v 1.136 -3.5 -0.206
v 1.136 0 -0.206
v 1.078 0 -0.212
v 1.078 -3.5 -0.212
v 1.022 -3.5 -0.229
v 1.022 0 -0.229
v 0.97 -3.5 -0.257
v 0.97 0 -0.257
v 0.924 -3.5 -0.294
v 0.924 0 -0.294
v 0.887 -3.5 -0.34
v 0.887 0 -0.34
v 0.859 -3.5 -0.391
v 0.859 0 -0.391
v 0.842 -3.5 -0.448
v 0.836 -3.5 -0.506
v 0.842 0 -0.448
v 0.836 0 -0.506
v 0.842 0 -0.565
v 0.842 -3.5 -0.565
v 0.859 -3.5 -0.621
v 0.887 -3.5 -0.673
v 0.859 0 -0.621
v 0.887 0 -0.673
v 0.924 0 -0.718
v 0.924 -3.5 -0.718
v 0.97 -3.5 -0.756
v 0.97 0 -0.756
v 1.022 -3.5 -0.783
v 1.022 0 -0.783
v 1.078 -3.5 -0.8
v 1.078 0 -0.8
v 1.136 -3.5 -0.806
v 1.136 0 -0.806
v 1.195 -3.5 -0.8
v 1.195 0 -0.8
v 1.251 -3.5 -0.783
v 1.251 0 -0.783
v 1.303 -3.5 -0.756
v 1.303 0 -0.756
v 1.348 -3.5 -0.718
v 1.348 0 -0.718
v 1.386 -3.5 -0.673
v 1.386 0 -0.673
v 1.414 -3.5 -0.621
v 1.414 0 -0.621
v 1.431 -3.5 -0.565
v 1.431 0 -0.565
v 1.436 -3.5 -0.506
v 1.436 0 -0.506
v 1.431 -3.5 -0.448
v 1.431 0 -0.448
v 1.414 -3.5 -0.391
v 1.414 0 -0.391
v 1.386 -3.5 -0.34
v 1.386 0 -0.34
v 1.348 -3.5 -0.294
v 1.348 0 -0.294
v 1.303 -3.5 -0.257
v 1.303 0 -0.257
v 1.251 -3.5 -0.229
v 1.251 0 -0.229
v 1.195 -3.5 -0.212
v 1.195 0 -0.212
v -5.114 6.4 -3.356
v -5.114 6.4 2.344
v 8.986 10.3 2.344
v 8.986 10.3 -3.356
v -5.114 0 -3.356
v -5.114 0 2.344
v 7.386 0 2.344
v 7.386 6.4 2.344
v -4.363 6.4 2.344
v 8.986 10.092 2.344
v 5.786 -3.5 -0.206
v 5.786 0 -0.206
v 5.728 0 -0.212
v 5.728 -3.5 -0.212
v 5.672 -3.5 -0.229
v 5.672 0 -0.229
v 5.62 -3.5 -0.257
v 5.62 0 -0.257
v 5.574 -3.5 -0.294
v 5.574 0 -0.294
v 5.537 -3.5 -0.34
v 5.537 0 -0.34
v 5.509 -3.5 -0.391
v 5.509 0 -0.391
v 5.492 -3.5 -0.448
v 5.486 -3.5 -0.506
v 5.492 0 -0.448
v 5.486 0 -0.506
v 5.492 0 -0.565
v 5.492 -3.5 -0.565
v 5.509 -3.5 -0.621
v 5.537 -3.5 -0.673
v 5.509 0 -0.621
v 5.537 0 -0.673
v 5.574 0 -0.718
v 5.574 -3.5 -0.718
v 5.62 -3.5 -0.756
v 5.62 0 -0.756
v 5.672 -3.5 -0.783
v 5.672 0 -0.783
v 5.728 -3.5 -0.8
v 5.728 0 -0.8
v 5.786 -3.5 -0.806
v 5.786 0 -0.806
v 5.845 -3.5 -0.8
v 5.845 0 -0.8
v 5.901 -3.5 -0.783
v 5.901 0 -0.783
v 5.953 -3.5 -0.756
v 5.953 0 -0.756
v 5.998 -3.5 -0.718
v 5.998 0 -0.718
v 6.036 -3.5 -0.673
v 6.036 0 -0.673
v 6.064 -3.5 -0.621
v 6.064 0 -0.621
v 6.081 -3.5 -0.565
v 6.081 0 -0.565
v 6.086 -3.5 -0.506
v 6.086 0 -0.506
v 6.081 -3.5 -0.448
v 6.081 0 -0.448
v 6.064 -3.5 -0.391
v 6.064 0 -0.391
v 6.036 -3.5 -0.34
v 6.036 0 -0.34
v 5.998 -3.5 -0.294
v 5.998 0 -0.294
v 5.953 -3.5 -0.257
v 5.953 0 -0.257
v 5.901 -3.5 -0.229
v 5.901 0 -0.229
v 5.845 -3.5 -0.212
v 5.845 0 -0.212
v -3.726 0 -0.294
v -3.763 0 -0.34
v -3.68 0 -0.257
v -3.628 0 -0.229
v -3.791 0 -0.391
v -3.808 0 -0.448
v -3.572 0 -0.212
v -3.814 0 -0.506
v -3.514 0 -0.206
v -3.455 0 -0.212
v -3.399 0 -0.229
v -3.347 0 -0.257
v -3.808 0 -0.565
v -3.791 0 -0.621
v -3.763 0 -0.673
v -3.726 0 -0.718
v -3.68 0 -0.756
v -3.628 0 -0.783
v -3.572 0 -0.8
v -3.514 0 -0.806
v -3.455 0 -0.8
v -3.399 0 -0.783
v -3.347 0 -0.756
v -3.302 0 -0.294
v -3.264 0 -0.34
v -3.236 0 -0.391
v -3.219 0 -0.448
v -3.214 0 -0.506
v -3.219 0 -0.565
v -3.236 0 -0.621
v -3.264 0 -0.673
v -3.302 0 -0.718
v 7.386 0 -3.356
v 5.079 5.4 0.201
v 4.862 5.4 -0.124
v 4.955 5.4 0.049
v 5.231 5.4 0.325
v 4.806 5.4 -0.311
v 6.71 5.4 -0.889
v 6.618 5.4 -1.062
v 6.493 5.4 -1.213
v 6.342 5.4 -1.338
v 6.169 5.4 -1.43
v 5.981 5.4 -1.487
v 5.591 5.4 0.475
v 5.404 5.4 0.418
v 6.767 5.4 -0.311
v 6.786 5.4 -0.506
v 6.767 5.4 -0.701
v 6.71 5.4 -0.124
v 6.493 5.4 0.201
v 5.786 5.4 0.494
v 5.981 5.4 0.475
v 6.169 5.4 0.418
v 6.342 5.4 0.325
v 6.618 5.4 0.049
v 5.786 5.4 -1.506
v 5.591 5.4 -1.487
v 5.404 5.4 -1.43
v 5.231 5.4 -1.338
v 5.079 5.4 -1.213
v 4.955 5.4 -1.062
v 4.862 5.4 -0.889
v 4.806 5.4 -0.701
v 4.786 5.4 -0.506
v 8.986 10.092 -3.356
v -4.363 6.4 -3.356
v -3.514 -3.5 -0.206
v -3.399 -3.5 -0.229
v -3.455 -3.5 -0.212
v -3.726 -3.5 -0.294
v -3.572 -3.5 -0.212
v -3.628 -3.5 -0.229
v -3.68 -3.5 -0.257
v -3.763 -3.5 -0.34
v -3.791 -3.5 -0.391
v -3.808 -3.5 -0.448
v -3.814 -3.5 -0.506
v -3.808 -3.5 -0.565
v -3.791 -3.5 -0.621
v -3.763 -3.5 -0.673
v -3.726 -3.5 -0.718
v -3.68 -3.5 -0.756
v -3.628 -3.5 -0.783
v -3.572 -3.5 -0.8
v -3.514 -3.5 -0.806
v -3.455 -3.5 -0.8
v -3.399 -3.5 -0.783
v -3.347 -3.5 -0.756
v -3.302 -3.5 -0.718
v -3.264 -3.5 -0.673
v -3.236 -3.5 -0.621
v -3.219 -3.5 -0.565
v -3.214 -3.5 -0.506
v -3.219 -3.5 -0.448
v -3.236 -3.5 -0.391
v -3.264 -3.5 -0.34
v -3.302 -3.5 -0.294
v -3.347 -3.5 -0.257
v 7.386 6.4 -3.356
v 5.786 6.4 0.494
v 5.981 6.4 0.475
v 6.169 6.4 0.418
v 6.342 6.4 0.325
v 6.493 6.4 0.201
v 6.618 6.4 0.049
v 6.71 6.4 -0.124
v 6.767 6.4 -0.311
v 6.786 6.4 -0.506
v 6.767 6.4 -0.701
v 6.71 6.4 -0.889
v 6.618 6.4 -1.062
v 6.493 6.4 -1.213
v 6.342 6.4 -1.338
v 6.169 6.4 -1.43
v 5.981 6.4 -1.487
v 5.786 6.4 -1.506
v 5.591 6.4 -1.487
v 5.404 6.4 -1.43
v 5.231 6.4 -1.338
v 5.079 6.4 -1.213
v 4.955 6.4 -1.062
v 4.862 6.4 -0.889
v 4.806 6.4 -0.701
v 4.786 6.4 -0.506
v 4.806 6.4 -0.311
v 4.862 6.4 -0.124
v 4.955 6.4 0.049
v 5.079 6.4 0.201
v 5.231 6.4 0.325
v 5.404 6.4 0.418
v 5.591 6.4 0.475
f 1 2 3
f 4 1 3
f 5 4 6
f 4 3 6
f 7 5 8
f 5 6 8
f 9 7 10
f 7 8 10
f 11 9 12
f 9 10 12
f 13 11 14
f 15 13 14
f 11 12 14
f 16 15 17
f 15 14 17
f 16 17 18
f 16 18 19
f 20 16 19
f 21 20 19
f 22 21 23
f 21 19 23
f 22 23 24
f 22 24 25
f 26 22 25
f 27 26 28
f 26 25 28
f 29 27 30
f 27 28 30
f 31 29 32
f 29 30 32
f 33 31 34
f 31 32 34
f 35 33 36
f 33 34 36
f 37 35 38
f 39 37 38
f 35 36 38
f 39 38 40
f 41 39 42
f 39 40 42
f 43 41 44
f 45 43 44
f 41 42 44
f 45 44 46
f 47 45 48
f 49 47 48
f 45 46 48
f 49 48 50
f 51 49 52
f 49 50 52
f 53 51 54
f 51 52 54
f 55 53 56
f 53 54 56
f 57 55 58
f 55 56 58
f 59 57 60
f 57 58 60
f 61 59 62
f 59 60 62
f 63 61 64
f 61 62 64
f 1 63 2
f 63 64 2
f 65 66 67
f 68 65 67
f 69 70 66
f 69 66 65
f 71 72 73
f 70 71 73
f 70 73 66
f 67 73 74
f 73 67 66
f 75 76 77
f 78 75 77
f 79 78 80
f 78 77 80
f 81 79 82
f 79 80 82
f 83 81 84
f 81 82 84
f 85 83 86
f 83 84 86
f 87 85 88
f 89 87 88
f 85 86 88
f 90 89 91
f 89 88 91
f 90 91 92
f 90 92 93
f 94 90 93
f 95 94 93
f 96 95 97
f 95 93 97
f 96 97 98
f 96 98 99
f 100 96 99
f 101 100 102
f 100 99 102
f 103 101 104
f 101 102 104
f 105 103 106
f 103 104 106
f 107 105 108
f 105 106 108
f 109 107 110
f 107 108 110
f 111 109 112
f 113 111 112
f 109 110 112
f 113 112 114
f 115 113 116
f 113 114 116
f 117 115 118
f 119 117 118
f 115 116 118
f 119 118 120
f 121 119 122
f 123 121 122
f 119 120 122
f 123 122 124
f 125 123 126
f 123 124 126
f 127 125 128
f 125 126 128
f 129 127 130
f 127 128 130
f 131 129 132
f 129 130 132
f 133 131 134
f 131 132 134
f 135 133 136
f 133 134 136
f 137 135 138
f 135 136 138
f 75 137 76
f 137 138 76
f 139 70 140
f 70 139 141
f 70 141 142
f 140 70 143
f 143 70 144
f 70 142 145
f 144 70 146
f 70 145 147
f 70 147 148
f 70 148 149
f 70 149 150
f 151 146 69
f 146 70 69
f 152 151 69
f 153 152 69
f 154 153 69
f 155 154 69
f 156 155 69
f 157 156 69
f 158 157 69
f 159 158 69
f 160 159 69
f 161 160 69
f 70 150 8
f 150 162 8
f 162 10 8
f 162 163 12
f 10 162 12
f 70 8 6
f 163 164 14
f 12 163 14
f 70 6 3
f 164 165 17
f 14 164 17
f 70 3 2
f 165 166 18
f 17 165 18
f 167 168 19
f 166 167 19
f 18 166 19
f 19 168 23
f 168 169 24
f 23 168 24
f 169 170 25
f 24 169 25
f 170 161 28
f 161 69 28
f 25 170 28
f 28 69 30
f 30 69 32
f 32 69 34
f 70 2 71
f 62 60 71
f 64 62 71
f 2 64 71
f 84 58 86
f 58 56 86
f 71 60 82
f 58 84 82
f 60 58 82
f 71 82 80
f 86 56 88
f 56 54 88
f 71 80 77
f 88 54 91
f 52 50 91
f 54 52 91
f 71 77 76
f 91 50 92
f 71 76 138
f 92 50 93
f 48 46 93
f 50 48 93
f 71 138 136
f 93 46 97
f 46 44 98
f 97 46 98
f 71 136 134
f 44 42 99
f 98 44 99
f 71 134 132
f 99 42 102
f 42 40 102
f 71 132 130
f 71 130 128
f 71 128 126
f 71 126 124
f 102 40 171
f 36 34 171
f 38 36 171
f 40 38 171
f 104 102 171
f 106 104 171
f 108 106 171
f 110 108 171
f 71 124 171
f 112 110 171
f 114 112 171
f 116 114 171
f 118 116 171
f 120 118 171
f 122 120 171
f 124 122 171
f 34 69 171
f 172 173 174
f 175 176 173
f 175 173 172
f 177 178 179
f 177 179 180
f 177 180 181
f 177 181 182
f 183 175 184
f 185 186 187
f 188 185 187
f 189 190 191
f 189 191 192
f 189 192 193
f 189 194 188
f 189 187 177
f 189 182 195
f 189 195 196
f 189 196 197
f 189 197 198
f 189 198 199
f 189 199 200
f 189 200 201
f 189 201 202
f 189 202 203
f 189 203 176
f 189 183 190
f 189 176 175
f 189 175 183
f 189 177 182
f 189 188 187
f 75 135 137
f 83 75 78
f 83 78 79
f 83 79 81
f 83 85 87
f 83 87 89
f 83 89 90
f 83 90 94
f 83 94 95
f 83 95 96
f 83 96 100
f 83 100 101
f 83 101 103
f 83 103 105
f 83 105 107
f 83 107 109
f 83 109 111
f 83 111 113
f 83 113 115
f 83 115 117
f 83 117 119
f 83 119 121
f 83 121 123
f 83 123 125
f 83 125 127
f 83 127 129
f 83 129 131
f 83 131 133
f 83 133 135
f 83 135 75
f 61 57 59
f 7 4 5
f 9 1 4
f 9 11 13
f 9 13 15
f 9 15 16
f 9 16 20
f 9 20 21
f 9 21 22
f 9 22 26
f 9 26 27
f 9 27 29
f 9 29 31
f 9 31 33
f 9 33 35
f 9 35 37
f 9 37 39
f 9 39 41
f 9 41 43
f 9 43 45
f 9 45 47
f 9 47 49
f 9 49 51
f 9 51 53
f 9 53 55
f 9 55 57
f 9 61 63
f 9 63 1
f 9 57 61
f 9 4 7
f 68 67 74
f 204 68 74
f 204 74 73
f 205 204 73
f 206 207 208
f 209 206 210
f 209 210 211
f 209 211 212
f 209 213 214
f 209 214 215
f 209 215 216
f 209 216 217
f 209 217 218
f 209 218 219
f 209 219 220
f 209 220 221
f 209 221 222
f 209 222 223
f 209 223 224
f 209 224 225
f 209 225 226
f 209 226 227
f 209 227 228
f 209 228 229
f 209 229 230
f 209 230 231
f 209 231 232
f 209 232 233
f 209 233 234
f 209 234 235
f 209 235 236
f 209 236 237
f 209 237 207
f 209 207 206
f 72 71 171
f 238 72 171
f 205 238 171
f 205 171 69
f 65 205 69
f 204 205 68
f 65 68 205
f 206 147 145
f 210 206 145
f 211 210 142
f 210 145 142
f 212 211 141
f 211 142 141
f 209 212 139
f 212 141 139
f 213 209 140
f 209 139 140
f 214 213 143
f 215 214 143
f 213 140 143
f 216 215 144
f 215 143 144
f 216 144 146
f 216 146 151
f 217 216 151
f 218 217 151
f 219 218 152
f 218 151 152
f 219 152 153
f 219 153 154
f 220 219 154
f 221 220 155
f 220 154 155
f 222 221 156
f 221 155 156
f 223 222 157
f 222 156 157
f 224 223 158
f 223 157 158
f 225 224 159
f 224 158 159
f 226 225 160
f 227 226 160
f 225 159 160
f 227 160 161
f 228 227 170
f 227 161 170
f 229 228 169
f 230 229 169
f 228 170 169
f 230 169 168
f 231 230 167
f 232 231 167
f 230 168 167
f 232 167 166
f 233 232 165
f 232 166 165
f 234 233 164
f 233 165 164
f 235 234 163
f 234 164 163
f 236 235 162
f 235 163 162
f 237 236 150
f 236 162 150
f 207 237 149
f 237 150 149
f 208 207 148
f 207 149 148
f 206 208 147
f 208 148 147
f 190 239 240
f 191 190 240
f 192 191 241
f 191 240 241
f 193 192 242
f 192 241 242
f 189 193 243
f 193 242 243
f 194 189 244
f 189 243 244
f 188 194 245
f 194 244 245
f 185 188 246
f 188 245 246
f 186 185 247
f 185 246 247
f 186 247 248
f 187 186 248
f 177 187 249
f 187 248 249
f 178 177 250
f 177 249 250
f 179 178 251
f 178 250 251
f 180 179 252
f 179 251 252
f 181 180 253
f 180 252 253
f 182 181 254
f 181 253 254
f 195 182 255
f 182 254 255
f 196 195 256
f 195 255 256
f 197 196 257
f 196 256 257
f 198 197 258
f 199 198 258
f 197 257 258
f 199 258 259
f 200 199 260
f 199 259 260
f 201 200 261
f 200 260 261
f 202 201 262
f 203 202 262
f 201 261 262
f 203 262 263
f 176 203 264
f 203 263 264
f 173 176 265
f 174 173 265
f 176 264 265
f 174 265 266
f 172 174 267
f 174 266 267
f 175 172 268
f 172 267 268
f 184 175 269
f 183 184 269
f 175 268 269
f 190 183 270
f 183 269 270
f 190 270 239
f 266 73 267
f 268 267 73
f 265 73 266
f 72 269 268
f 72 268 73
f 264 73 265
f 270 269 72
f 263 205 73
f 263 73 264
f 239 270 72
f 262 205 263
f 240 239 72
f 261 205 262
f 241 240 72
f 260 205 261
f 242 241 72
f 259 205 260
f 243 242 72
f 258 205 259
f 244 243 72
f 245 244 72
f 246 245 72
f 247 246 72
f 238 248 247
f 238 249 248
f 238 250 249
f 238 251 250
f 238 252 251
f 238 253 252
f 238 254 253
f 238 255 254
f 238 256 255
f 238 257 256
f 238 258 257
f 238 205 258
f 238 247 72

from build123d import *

# Parameters (mm, degrees)
SKETCH1_W           = 12.5
SKETCH1_H           = 5.7
BOSS_EXTRUDE1_DEPTH = 6.4
BOSS_EXTRUDE2_DEPTH = 5.7
SKETCH3_R           = 0.3
BOSS_EXTRUDE3_DEPTH = 3.5
SKETCH4_R           = 1
CUT_EXTRUDE1_DEPTH  = 1


with BuildPart() as part:
    # Sketch1 → Boss-Extrude1 (new body)
    with BuildSketch(Plane(origin=(0, 0, 0), x_dir=(1, 0, 0), z_dir=(0, 1, 0))):
        with Locations((1.136363636, 0.50625)):
            Rectangle(SKETCH1_W, SKETCH1_H)
    extrude(amount=BOSS_EXTRUDE1_DEPTH)

    # Sketch2 → Boss-Extrude2 (add)
    with BuildSketch(Plane.XY.offset(2.34375)):
        Polygon((-5.113636364, 6.4), (8.986363636, 10.3), (8.986363636, 10.092490462), (-5.113636364, 6.192490462), align=None)
    extrude(amount=-BOSS_EXTRUDE2_DEPTH)

    # Sketch3 → Boss-Extrude3 (add)
    with BuildSketch(Plane.XZ):
        with Locations(Location((-3.513636364, -0.50625, 0), (0, 0, 90))):
            Circle(SKETCH3_R)
        with Locations(Location((1.136363636, -0.50625, 0), (0, 0, 90))):
            Circle(SKETCH3_R)
        with Locations(Location((5.786363636, -0.50625, 0), (0, 0, 90))):
            Circle(SKETCH3_R)
    extrude(amount=BOSS_EXTRUDE3_DEPTH)

    # Sketch4 → Cut-Extrude1 (cut)
    with BuildSketch(Plane(origin=(0, 6.4, 0), x_dir=(1, 0, 0), z_dir=(0, 1, 0))):
        with Locations(Location((5.786363636, 0.50625, 0), (0, 0, 270))):
            Circle(SKETCH4_R)
    extrude(amount=-CUT_EXTRUDE1_DEPTH, mode=Mode.SUBTRACT)


solid = part.part
